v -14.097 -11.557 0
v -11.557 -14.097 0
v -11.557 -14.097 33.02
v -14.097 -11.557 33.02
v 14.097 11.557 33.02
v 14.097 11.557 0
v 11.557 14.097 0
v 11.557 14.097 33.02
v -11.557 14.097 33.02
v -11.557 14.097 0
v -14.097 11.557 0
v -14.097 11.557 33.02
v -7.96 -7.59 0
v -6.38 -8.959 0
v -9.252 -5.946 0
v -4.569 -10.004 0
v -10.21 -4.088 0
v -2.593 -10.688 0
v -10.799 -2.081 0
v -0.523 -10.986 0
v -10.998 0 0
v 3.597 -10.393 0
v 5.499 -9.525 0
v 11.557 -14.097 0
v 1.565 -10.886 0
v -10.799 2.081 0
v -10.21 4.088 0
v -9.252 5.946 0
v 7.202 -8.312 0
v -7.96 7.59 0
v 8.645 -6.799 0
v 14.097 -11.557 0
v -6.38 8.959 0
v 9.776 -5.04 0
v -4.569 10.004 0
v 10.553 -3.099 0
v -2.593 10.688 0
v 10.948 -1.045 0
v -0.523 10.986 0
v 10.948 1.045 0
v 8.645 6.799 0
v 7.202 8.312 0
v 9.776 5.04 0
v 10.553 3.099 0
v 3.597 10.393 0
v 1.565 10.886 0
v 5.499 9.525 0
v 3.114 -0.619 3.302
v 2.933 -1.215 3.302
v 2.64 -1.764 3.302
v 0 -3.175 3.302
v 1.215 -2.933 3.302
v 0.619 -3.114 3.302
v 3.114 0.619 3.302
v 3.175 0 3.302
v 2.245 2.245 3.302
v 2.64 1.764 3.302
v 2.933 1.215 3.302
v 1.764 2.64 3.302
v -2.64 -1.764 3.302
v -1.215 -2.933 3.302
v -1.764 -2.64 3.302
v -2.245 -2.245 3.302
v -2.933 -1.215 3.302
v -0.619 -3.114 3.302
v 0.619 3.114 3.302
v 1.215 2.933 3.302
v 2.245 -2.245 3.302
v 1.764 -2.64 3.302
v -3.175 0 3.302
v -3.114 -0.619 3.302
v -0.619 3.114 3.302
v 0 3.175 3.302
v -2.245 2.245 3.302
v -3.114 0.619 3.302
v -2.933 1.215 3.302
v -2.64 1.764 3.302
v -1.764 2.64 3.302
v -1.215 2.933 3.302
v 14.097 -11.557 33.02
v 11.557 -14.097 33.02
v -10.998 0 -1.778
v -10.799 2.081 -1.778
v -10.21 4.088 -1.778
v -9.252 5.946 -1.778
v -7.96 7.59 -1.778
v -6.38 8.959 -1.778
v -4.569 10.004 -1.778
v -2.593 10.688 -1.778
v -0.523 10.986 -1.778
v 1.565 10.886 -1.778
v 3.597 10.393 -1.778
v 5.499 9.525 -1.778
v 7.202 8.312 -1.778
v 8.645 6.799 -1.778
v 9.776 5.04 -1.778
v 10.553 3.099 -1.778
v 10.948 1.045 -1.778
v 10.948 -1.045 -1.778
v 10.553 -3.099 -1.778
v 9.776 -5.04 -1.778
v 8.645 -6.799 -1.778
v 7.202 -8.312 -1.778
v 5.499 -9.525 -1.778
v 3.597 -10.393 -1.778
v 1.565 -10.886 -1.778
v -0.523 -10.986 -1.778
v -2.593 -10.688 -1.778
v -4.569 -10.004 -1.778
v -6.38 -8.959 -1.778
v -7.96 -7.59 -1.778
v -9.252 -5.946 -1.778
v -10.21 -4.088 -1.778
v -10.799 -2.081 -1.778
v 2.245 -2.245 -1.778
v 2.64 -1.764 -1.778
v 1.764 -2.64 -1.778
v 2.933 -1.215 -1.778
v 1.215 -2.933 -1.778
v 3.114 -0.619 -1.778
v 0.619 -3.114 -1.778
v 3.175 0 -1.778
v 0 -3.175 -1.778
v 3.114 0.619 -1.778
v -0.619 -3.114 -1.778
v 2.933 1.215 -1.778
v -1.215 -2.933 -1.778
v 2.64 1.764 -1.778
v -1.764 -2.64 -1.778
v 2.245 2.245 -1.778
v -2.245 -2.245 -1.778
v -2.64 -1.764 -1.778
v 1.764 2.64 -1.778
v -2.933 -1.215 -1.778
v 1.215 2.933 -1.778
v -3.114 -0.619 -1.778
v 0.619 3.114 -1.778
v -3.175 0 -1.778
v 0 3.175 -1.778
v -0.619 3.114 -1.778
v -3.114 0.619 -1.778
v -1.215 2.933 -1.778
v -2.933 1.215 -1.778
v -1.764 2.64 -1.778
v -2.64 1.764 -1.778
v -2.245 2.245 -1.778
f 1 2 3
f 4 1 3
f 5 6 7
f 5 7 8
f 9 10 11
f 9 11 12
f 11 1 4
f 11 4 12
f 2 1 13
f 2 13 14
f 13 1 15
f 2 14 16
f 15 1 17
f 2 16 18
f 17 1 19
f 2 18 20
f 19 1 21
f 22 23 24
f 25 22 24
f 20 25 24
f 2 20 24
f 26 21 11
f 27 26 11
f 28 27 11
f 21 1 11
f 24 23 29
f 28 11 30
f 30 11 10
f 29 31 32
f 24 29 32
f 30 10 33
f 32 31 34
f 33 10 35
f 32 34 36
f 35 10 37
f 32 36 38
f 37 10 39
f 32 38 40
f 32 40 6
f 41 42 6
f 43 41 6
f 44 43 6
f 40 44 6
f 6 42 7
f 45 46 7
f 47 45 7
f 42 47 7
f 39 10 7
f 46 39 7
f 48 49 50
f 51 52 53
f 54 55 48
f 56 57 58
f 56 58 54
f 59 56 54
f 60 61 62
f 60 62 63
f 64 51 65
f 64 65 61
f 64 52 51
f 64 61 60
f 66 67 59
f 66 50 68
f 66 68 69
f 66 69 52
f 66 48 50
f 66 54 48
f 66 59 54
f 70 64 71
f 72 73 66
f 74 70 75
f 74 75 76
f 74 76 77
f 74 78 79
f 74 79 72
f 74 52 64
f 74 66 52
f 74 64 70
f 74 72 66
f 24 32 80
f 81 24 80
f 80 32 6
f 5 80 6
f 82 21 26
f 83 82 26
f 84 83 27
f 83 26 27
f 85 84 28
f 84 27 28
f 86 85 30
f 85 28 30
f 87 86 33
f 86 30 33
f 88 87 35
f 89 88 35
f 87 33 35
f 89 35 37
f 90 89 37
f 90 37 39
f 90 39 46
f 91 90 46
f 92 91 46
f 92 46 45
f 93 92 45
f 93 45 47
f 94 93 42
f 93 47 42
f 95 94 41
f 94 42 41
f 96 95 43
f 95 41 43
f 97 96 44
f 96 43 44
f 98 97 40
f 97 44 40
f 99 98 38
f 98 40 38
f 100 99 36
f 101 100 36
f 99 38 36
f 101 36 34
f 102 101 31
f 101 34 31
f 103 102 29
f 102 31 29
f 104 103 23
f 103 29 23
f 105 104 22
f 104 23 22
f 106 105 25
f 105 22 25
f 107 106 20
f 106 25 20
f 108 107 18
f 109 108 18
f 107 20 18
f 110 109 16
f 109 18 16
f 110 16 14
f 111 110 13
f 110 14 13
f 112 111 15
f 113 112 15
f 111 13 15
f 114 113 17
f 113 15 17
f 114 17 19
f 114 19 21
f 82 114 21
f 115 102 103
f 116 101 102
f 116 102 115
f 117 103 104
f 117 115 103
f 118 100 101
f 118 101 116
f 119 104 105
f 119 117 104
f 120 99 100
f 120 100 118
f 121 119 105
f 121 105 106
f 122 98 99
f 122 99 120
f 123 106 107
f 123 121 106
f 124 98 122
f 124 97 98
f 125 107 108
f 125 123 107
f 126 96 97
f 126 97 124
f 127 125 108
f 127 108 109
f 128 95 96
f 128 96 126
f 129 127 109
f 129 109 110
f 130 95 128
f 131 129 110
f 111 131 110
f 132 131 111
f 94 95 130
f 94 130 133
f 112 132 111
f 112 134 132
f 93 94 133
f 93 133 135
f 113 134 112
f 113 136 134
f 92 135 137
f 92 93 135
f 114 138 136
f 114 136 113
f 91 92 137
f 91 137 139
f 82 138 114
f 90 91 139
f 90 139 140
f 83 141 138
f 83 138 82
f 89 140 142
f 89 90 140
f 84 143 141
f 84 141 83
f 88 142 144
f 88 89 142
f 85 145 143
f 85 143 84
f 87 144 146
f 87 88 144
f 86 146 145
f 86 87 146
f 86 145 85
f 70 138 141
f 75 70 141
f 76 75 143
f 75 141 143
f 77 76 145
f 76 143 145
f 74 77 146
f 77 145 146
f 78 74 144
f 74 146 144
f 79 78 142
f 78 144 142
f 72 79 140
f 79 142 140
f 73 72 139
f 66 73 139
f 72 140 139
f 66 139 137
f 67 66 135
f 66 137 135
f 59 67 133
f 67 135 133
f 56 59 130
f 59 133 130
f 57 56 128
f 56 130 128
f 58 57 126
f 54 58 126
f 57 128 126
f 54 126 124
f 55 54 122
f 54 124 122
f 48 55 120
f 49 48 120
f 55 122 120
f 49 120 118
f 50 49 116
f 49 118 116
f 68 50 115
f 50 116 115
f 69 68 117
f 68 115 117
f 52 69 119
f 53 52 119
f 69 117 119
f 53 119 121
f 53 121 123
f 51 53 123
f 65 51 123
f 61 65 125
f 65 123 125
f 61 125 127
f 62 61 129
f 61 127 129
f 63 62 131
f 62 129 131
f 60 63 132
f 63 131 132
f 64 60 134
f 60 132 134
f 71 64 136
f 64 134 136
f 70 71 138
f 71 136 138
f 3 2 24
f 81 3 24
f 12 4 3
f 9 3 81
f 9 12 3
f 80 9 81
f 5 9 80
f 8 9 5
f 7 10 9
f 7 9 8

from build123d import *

# Parameters (mm, degrees)
SKETCH1_W           = 28.194
SKETCH1_H           = 28.194
BOSS_EXTRUDE1_DEPTH = 33.02
SKETCH3_R           = 10.9982
BOSS_EXTRUDE2_DEPTH = 1.778
SKETCH5_R           = 3.175
CUT_EXTRUDE1_DEPTH  = 5.08
CHAMFER1_SIZE       = 2.54


with BuildPart() as part:
    # Sketch1 → Boss-Extrude1 (new body)
    with BuildSketch(Plane.XY):
        Rectangle(SKETCH1_W, SKETCH1_H)
    extrude(amount=BOSS_EXTRUDE1_DEPTH)

    # Sketch3 → Boss-Extrude2 (add)
    with BuildSketch(Plane(origin=(0, 0, 0), x_dir=(-1, 0, 0), z_dir=(0, 0, -1))):
        Circle(SKETCH3_R)
    extrude(amount=BOSS_EXTRUDE2_DEPTH)

    # Sketch5 → Cut-Extrude1 (cut)
    with BuildSketch(Plane(origin=(0, 0, -1.778), x_dir=(-1, 0, 0), z_dir=(0, 0, -1))):
        Circle(SKETCH5_R)
    extrude(amount=-CUT_EXTRUDE1_DEPTH, mode=Mode.SUBTRACT)

    # Chamfer1
    chamfer1_edges = [part.edges().sort_by_distance(p)[0] for p in [
        (-14.097, 14.097, 16.51),
        (14.097, 14.097, 16.51),
        (14.097, -14.097, 16.51),
        (-14.097, -14.097, 16.51),
    ]]
    chamfer(chamfer1_edges, length=CHAMFER1_SIZE)


solid = part.part
